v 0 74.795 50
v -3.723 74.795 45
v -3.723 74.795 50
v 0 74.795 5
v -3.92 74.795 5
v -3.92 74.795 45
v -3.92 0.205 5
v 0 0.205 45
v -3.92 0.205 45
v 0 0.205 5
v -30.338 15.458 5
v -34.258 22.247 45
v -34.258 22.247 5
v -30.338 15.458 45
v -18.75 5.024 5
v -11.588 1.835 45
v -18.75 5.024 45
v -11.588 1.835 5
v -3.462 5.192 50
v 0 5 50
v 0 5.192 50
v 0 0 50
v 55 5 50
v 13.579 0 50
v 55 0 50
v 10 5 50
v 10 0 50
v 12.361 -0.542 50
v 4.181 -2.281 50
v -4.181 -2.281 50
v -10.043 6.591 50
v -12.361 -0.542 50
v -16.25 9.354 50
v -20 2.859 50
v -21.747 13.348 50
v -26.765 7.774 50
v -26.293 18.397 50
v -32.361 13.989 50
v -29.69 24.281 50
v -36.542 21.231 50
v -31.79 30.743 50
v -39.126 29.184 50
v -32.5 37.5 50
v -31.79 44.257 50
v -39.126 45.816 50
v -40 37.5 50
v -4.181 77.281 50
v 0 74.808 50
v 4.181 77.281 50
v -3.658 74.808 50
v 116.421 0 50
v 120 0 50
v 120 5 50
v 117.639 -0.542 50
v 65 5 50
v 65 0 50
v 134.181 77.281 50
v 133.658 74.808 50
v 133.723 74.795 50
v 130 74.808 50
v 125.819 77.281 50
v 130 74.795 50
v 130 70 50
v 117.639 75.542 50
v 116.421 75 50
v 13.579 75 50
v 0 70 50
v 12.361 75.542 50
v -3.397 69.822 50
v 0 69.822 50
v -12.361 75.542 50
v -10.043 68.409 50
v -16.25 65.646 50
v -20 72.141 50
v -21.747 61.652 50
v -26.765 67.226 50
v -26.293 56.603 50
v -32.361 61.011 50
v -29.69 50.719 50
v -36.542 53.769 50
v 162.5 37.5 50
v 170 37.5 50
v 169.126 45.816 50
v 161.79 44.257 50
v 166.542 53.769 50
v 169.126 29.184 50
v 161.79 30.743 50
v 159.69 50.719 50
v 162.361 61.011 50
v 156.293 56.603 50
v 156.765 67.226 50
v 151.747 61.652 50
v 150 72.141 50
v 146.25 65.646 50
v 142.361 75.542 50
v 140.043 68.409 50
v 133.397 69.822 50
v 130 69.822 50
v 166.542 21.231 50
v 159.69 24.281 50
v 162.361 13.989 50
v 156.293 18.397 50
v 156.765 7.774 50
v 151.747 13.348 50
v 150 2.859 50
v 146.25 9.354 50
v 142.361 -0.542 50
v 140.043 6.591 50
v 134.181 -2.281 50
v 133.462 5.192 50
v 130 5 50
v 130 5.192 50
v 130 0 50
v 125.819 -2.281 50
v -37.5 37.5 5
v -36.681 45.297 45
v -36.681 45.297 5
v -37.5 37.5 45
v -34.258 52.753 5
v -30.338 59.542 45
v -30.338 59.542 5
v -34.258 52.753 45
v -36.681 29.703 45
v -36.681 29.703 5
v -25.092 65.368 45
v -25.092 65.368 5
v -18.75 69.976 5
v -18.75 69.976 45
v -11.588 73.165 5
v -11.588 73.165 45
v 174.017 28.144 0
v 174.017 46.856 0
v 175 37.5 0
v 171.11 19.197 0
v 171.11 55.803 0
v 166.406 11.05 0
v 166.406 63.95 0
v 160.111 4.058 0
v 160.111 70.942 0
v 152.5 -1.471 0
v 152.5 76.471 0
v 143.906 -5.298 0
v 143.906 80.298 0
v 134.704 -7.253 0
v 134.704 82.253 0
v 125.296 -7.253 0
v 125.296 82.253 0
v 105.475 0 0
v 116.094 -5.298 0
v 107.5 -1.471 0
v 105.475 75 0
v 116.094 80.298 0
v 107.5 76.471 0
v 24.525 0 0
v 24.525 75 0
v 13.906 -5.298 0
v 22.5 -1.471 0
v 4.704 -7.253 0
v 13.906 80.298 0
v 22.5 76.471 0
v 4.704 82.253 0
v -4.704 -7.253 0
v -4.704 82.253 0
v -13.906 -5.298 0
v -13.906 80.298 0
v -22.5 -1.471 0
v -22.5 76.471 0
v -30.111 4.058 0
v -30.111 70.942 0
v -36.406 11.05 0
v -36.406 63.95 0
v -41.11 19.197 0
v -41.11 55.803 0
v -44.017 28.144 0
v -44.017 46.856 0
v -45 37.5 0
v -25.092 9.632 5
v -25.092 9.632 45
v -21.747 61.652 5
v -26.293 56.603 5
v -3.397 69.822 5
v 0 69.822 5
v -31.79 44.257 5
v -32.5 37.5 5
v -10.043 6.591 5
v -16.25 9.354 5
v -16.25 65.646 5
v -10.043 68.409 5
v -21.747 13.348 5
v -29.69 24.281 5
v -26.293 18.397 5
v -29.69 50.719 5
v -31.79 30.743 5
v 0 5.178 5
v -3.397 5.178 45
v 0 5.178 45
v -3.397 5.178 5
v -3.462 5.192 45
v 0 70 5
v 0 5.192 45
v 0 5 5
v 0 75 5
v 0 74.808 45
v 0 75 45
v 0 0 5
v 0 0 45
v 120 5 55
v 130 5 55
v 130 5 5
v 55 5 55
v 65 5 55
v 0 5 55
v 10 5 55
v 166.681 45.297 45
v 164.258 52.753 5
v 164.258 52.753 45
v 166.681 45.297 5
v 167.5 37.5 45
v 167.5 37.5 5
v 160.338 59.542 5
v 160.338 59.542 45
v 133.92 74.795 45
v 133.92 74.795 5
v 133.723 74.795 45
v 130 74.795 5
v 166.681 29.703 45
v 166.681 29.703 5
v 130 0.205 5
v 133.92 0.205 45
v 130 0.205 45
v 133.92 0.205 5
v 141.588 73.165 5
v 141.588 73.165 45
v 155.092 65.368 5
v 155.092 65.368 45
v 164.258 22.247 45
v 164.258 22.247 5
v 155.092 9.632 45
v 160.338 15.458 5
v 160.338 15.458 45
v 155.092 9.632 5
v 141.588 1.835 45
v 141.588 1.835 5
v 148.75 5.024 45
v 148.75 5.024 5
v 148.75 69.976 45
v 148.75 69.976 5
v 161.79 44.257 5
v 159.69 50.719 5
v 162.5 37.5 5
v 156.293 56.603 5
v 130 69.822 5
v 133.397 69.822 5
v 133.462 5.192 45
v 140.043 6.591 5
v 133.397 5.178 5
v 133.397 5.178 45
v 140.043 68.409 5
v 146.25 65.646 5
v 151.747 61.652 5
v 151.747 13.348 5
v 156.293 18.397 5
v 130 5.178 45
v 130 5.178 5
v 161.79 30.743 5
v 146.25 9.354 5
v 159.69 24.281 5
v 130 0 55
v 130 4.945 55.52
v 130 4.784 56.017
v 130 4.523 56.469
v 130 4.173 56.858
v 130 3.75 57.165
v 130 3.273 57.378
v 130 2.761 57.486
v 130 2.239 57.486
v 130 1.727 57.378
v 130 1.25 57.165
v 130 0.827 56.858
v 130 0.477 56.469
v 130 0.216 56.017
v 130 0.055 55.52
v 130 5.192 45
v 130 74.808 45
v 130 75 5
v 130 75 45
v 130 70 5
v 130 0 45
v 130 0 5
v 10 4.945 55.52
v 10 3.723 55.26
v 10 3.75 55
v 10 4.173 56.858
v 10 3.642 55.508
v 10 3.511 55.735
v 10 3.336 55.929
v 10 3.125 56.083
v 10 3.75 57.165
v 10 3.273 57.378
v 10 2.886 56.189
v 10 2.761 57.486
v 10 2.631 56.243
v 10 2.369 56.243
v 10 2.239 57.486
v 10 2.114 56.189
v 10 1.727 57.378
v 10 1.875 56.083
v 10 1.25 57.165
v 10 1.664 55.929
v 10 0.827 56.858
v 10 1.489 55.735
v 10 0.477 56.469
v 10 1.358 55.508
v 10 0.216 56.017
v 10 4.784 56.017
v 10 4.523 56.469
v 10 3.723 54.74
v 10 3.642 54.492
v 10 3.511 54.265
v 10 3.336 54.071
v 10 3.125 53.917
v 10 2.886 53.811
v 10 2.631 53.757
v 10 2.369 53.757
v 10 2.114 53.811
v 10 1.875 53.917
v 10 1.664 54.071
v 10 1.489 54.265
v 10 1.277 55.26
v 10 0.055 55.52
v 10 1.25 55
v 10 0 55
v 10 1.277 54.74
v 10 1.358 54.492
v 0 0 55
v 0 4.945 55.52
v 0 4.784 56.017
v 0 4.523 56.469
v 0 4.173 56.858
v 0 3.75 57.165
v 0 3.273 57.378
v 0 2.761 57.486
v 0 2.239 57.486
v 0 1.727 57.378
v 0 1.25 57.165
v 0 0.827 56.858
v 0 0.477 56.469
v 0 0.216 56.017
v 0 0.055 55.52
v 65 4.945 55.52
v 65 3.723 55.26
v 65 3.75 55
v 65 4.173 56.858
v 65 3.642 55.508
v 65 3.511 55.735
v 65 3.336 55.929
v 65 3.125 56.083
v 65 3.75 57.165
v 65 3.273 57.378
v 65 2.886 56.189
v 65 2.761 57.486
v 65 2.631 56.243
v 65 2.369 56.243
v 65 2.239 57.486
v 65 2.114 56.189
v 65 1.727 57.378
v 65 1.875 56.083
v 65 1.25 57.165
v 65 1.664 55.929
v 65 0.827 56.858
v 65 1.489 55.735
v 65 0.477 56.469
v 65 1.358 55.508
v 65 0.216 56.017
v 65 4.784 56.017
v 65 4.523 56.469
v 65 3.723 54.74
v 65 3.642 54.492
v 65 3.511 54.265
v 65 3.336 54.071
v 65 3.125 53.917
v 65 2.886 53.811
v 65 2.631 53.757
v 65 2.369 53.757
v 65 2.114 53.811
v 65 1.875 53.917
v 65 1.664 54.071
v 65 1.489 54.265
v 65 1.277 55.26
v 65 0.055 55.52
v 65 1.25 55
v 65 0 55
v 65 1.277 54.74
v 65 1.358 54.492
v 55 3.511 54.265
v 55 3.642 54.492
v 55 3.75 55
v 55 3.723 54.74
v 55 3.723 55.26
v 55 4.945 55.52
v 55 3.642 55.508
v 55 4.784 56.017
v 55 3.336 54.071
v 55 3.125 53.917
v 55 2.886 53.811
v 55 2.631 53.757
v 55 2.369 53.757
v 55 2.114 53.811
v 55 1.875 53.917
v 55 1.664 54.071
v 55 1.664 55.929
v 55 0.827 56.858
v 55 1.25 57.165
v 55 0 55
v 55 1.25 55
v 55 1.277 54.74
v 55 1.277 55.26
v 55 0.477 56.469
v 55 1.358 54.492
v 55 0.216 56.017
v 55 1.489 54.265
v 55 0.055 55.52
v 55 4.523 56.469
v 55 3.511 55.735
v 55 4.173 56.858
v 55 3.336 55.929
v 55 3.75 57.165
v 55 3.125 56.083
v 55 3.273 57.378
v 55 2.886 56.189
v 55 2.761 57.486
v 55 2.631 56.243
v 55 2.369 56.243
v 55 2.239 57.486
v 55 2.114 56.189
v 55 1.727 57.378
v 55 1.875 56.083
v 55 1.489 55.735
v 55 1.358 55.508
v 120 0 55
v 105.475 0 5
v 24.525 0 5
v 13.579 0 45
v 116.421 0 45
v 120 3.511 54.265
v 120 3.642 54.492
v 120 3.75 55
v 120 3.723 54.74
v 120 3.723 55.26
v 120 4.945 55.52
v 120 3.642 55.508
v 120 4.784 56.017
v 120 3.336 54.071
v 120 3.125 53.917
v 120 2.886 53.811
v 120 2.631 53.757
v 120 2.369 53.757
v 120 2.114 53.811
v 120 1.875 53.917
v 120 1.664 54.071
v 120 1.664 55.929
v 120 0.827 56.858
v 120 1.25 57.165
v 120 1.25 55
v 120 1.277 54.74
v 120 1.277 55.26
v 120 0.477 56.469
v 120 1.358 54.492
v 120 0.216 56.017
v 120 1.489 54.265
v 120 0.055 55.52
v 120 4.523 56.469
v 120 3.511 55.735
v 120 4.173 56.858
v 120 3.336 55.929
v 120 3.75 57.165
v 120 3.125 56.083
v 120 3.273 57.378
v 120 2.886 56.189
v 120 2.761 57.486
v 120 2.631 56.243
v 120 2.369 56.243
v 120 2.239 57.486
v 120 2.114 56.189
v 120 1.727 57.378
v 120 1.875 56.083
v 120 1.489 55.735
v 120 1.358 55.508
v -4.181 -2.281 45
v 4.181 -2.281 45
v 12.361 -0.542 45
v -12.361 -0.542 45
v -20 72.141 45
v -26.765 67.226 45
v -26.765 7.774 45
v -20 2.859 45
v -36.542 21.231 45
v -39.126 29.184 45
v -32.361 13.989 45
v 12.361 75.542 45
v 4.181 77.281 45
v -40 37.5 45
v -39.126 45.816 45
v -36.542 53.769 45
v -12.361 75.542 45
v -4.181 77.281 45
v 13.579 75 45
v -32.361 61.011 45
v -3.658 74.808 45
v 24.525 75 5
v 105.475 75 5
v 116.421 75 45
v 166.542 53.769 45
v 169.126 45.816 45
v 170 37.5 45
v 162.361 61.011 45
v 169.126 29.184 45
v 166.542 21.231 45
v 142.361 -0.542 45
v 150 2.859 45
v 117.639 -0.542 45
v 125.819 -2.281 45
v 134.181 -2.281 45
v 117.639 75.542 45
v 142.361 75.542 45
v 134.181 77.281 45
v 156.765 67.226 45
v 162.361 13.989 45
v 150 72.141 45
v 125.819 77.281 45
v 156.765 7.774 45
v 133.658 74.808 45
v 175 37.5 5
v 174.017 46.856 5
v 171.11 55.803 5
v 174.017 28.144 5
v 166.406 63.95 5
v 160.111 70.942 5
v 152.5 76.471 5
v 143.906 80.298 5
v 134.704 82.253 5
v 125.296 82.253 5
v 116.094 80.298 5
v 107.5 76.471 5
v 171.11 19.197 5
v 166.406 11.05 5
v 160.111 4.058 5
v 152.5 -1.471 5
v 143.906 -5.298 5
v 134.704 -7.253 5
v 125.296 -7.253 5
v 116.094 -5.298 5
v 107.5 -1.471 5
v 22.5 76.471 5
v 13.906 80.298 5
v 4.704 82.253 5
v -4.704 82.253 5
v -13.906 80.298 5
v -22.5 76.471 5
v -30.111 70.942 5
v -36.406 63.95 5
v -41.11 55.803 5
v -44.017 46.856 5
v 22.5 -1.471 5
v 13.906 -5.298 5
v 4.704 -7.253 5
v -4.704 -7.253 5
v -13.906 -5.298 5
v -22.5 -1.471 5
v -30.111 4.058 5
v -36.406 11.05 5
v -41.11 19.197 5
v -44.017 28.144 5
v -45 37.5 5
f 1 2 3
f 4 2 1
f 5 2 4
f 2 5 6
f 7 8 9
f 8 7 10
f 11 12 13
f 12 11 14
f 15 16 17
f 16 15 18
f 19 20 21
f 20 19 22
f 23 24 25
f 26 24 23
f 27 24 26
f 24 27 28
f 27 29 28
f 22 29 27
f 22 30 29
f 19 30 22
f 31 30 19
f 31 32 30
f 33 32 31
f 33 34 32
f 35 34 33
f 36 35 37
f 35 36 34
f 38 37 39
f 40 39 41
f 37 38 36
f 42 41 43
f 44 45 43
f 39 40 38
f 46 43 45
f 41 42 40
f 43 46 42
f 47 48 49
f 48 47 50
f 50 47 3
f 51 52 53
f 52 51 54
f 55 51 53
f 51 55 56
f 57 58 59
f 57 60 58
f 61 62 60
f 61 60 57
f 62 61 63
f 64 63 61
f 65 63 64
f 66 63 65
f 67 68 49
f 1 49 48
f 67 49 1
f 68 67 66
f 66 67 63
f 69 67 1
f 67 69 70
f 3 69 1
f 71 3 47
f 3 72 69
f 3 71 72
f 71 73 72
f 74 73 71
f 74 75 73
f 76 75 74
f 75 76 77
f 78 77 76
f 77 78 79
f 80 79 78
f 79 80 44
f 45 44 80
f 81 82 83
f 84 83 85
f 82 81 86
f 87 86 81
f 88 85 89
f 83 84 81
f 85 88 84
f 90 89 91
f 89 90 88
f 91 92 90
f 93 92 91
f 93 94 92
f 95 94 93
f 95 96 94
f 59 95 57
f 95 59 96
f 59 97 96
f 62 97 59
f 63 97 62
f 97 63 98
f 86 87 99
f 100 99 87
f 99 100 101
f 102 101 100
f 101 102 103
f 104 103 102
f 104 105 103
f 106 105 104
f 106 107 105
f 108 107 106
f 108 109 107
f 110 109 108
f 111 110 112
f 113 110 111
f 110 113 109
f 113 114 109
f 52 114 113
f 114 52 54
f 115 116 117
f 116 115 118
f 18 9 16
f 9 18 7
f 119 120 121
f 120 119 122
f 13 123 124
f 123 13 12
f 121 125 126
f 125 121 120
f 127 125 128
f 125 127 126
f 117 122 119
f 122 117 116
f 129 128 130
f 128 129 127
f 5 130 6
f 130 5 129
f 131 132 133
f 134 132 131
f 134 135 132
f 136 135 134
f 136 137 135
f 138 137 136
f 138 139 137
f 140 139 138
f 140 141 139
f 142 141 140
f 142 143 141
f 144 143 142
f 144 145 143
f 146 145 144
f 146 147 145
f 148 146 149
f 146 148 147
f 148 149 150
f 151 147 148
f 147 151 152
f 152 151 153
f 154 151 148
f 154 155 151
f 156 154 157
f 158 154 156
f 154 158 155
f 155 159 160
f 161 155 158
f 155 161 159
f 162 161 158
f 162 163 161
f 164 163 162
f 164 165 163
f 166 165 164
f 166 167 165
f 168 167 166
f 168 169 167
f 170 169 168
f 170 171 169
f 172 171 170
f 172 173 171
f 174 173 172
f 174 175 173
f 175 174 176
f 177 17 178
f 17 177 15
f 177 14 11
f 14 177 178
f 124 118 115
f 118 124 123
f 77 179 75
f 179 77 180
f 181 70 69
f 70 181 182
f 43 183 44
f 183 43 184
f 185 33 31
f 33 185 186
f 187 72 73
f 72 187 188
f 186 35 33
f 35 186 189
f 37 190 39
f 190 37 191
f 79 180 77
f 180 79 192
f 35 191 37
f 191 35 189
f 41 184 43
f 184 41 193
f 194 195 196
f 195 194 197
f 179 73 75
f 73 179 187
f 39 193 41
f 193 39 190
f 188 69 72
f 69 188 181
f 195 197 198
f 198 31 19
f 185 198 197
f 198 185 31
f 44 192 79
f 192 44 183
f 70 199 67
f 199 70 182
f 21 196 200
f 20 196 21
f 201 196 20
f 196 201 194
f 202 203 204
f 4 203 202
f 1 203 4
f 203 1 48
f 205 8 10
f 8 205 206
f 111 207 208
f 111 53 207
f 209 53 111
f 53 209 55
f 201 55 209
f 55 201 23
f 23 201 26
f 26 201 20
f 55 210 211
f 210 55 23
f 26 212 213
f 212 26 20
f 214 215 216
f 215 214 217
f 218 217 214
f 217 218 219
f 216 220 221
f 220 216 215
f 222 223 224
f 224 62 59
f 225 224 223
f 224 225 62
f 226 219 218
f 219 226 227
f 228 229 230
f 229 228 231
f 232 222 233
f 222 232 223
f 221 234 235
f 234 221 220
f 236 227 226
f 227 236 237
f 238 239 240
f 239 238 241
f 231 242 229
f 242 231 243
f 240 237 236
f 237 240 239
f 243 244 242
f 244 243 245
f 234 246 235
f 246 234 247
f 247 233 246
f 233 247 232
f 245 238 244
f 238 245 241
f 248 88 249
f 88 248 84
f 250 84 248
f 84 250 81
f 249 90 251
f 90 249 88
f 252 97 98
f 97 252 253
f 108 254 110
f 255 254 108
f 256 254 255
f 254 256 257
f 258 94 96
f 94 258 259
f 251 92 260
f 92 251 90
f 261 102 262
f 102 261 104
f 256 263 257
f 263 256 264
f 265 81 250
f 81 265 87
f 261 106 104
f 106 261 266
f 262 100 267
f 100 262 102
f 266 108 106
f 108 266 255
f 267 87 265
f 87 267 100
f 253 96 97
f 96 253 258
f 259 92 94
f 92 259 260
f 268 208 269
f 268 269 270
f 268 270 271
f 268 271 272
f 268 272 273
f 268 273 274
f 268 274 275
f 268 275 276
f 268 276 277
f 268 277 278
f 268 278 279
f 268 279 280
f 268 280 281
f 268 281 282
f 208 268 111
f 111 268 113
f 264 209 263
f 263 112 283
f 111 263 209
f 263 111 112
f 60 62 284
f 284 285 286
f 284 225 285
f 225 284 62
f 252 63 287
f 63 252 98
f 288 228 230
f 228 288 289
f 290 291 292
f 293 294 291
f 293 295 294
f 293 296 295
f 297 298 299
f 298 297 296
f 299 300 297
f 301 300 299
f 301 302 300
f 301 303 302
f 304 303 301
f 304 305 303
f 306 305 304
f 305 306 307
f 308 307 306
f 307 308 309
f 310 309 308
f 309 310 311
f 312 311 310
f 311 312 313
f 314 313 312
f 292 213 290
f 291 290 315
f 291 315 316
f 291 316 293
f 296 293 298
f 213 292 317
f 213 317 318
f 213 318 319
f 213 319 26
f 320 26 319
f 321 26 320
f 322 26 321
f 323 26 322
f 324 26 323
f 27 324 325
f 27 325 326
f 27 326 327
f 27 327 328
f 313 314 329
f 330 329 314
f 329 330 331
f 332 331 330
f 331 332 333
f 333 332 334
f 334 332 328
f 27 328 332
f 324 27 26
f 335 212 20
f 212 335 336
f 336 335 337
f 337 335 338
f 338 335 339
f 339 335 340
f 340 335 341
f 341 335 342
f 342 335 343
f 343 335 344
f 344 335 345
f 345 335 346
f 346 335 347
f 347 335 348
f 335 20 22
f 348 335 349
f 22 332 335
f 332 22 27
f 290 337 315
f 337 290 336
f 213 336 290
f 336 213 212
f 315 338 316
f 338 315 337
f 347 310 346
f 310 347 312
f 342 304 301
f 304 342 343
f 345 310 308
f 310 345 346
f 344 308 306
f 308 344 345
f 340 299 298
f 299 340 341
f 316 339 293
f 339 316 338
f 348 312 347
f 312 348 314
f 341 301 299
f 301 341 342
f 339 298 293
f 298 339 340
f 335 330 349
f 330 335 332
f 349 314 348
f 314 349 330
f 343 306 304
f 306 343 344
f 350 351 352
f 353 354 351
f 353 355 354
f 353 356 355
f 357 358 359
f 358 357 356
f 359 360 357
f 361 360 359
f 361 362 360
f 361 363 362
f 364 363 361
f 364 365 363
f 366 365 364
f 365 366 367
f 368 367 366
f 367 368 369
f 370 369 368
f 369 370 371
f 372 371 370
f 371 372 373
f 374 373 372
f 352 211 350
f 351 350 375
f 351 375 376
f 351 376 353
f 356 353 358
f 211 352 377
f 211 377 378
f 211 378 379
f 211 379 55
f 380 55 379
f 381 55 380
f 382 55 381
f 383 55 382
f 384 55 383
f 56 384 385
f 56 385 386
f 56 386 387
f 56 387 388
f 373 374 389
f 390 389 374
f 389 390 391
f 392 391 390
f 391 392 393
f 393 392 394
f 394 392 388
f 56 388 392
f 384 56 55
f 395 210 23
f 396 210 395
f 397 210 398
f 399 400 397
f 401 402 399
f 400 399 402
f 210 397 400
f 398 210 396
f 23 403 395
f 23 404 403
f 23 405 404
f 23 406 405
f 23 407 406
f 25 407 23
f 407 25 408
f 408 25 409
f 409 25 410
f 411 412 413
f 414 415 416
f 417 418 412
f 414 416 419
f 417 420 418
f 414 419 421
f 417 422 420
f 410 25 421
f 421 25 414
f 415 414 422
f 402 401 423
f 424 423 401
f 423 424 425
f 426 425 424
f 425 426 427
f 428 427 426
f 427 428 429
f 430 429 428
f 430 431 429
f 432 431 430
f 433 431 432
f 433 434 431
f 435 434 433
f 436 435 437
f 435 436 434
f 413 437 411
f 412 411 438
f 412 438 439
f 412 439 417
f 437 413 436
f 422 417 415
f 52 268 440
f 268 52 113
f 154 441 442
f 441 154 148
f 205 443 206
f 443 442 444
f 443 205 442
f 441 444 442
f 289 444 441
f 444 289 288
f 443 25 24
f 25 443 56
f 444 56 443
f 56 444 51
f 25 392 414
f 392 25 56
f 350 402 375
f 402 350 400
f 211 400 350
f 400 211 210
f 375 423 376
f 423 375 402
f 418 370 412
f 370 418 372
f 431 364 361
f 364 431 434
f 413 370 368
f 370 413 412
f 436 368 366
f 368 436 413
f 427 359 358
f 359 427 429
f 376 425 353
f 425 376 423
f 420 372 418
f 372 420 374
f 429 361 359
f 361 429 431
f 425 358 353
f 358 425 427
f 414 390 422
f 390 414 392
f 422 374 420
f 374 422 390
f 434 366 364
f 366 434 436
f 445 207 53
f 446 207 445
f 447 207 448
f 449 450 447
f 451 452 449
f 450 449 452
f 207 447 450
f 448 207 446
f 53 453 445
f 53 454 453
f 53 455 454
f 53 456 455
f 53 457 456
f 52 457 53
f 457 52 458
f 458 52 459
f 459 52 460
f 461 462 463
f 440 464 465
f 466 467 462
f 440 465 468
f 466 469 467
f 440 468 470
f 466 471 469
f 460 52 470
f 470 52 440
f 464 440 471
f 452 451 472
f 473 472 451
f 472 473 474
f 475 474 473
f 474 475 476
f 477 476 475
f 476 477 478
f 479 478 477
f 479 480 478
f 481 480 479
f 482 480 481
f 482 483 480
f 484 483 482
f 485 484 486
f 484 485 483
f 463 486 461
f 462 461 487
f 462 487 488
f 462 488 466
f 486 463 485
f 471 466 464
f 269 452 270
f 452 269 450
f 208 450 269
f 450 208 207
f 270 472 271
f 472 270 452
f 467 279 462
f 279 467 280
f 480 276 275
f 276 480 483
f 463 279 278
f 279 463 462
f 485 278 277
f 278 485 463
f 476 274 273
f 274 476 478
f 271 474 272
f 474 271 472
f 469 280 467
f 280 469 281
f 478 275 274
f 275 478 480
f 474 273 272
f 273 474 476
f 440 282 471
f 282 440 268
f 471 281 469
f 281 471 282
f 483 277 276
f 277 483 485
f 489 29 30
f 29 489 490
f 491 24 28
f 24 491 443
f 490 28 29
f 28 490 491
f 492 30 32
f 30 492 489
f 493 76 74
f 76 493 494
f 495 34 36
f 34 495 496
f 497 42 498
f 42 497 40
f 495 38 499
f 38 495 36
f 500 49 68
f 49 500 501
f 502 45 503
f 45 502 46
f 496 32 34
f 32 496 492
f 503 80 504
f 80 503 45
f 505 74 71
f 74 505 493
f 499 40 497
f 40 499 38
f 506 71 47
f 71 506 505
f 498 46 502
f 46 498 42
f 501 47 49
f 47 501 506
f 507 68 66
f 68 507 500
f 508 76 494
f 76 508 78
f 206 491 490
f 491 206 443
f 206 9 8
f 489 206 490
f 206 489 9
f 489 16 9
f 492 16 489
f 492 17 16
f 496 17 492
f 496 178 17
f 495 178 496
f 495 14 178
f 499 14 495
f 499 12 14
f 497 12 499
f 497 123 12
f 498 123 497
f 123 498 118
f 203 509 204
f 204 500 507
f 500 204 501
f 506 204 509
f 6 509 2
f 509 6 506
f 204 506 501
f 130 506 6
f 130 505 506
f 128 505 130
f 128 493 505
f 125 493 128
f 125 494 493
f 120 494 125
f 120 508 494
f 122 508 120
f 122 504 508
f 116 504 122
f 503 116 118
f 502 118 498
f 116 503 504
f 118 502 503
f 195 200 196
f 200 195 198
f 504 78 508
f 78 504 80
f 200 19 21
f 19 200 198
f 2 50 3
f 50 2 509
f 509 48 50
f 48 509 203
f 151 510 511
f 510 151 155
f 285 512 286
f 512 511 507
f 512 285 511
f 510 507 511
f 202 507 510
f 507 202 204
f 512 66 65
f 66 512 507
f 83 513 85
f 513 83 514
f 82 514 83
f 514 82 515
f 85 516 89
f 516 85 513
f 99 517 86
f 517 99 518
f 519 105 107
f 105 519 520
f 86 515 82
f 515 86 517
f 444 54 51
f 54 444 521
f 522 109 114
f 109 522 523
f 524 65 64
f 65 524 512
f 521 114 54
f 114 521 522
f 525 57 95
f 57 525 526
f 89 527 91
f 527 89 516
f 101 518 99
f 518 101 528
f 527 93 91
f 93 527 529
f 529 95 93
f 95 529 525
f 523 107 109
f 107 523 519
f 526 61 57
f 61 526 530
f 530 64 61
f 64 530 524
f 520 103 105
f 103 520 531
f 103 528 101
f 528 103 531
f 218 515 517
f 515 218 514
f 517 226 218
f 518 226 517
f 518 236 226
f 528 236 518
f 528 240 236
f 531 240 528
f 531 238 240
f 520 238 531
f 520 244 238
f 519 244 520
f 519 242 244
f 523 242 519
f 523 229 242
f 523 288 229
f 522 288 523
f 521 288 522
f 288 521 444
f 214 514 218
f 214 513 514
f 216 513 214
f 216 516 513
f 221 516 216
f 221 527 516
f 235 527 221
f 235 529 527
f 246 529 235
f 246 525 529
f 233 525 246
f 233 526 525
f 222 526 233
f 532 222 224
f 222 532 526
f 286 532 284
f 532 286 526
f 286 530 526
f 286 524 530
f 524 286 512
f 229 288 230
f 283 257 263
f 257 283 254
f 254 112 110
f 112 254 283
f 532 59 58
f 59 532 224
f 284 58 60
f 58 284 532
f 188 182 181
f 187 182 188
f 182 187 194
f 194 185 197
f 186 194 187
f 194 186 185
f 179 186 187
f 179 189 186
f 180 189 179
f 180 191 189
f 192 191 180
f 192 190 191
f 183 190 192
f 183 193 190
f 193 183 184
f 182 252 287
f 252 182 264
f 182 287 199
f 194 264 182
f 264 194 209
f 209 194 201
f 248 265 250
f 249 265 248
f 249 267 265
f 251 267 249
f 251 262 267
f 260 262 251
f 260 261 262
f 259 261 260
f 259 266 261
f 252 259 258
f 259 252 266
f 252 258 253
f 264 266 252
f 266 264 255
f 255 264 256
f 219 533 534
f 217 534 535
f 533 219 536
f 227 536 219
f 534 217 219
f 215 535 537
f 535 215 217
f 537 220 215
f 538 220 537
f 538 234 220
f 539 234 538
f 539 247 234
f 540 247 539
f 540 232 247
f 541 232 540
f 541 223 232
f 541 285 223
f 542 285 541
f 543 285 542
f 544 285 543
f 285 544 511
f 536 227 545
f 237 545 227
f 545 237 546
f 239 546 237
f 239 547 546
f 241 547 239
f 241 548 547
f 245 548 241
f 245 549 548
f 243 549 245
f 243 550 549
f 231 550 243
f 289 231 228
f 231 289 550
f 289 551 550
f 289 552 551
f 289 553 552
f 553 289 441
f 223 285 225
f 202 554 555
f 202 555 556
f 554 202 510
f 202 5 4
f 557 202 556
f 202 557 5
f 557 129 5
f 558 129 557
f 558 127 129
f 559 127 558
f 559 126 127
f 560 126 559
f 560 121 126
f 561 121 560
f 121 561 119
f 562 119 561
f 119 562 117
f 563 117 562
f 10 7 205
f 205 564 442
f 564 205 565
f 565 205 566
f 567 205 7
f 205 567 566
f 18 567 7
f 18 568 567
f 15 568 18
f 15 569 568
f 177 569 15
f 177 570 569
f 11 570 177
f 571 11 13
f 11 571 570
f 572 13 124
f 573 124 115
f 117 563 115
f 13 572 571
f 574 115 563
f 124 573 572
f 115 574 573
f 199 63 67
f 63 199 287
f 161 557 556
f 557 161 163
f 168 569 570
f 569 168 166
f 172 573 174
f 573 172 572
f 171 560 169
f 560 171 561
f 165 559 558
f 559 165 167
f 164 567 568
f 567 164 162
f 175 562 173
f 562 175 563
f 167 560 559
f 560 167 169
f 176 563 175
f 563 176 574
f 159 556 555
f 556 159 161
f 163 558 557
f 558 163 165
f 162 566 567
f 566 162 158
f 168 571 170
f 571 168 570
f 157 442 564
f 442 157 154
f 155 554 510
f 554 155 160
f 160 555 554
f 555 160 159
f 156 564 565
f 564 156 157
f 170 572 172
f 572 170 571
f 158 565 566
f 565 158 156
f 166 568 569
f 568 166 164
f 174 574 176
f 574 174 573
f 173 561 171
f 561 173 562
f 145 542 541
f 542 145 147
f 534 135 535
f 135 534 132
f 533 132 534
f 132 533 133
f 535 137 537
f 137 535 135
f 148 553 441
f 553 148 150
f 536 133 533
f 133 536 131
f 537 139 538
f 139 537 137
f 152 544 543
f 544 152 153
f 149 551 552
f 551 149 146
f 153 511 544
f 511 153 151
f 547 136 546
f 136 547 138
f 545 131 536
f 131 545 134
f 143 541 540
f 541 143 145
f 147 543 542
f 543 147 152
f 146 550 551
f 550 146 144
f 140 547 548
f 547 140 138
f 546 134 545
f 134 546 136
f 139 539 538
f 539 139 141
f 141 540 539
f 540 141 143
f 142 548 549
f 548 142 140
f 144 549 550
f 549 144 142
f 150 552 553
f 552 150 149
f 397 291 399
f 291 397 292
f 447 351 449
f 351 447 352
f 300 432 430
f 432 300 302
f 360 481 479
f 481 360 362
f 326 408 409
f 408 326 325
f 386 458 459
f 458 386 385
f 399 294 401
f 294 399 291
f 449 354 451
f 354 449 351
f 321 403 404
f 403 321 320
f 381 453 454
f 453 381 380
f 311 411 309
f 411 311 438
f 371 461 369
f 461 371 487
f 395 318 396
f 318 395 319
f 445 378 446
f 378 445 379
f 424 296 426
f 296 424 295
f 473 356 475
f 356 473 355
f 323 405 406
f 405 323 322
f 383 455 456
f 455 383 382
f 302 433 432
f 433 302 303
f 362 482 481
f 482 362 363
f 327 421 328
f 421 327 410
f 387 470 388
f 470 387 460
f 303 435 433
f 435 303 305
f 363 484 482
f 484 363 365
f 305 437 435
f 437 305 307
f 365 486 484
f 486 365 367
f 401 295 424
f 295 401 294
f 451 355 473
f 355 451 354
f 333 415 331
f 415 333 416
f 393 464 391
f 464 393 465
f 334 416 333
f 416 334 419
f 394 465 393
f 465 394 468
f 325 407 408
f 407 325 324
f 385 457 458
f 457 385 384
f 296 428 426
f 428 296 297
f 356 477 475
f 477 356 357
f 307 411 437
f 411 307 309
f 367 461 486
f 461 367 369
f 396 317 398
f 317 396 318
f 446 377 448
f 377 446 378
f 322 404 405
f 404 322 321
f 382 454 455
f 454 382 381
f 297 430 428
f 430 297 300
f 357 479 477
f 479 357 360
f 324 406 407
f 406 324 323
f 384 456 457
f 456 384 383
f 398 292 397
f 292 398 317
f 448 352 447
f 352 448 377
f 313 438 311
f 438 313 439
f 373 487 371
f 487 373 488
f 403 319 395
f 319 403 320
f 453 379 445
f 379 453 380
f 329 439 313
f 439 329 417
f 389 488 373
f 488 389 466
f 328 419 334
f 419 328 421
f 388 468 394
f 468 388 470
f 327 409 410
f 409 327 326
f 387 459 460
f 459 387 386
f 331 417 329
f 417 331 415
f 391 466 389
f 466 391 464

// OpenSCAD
$fn=30;

//The variables hcoffre, lcoffrex,lcoffrey and llamey represent in the same order: 1) the height of the object 2) the lenght of the object 3) the width of the object 4) the thickness of the object. All values can be changed but it is recommended not to change the "llamey" value for the fonctionnality of the object.

hcoffre= 50;
lcoffrex= 130;
llamey= 5;
lcoffrey=70;



module base(){

//the first part represent the base of the object

cube([lcoffrex,lcoffrey,llamey]) ;

translate([0,lcoffrey/2+5,0])cylinder(h=llamey,r=lcoffrey/2+5) ;

translate([lcoffrex,lcoffrey/2+5,0])cylinder(h=llamey,r=lcoffrey/2+5) ;


//the second part represents the sides of the object

cube([lcoffrex,llamey,hcoffre]) ;

translate([0,lcoffrey,0])cube([lcoffrex,llamey,hcoffre]) ;

difference(){translate([0,lcoffrey/2+llamey/2,0])cylinder(h=hcoffre,r=lcoffrey/2+llamey/2);
translate([0,lcoffrey/2+llamey/2,0])cylinder(h=hcoffre,r=lcoffrey/2-llamey/2) ;translate([0,llamey,0])cube([lcoffrex/2,lcoffrey,hcoffre]); }

difference(){translate([lcoffrex,lcoffrey/2+llamey/2,0])cylinder(h=hcoffre,r=lcoffrey/2+llamey/2) ;
translate([lcoffrex,lcoffrey/2+llamey/2,0])cylinder(h=hcoffre,r=lcoffrey/2-llamey/2) ;translate([lcoffrex/2,llamey,0])cube([lcoffrex/2,lcoffrey,hcoffre]); }

//the next part represents the support of the pencil case

union() {translate([0,0,hcoffre])cube([10,llamey,5]) ;

rotate([90,0,90])translate([llamey/2,hcoffre+5,0])cylinder(h=10,r=llamey/2) ;}

translate([lcoffrex/2-10,0,0])union() {translate([0,0,hcoffre])cube([10,llamey,5]) ;

rotate([90,0,90])translate([llamey/2,hcoffre+5,0])cylinder(h=10,r=llamey/2) ;}

translate([lcoffrex-10,0,0])union() {translate([0,0,hcoffre])cube([10,llamey,5]) ;

rotate([90,0,90])translate([llamey/2,hcoffre+5,0])cylinder(h=10,r=llamey/2) ;}


translate([0,lcoffrey/2+llamey/2,0])cylinder(h=llamey,r=lcoffrey/2+10);

translate([lcoffrex,lcoffrey/2+llamey/2,0])cylinder(h=llamey,r=lcoffrey/2+10);

//the last part of the object represent the support for the rotation rod who will put together both parts of the pencil case

difference(){translate([0,lcoffrey/2+llamey/2,hcoffre-llamey])cylinder(h=llamey,r=lcoffrey/2+llamey);
translate([0,lcoffrey/2+5,hcoffre-10])cylinder(h=hcoffre,r=lcoffrey/2) ;translate([0,llamey,hcoffre-10])cube([lcoffrex/2,lcoffrey,hcoffre]); }

difference(){translate([lcoffrex,lcoffrey/2+llamey/2,hcoffre-llamey])cylinder(h=llamey,r=lcoffrey/2+llamey);
translate([lcoffrex,lcoffrey/2+5,hcoffre-10])cylinder(h=hcoffre,r=lcoffrey/2) ;translate([lcoffrex/2,llamey,hcoffre-10])cube([lcoffrex/2,lcoffrey,hcoffre]); }


}
base();

//the module key represent the rotation rod who will put together both parts of the pencil

module key(){
translate([0,llamey/2,hcoffre+5])rotate([90,0,90])cylinder(h=lcoffrex,r=llamey/4);
}
key();
